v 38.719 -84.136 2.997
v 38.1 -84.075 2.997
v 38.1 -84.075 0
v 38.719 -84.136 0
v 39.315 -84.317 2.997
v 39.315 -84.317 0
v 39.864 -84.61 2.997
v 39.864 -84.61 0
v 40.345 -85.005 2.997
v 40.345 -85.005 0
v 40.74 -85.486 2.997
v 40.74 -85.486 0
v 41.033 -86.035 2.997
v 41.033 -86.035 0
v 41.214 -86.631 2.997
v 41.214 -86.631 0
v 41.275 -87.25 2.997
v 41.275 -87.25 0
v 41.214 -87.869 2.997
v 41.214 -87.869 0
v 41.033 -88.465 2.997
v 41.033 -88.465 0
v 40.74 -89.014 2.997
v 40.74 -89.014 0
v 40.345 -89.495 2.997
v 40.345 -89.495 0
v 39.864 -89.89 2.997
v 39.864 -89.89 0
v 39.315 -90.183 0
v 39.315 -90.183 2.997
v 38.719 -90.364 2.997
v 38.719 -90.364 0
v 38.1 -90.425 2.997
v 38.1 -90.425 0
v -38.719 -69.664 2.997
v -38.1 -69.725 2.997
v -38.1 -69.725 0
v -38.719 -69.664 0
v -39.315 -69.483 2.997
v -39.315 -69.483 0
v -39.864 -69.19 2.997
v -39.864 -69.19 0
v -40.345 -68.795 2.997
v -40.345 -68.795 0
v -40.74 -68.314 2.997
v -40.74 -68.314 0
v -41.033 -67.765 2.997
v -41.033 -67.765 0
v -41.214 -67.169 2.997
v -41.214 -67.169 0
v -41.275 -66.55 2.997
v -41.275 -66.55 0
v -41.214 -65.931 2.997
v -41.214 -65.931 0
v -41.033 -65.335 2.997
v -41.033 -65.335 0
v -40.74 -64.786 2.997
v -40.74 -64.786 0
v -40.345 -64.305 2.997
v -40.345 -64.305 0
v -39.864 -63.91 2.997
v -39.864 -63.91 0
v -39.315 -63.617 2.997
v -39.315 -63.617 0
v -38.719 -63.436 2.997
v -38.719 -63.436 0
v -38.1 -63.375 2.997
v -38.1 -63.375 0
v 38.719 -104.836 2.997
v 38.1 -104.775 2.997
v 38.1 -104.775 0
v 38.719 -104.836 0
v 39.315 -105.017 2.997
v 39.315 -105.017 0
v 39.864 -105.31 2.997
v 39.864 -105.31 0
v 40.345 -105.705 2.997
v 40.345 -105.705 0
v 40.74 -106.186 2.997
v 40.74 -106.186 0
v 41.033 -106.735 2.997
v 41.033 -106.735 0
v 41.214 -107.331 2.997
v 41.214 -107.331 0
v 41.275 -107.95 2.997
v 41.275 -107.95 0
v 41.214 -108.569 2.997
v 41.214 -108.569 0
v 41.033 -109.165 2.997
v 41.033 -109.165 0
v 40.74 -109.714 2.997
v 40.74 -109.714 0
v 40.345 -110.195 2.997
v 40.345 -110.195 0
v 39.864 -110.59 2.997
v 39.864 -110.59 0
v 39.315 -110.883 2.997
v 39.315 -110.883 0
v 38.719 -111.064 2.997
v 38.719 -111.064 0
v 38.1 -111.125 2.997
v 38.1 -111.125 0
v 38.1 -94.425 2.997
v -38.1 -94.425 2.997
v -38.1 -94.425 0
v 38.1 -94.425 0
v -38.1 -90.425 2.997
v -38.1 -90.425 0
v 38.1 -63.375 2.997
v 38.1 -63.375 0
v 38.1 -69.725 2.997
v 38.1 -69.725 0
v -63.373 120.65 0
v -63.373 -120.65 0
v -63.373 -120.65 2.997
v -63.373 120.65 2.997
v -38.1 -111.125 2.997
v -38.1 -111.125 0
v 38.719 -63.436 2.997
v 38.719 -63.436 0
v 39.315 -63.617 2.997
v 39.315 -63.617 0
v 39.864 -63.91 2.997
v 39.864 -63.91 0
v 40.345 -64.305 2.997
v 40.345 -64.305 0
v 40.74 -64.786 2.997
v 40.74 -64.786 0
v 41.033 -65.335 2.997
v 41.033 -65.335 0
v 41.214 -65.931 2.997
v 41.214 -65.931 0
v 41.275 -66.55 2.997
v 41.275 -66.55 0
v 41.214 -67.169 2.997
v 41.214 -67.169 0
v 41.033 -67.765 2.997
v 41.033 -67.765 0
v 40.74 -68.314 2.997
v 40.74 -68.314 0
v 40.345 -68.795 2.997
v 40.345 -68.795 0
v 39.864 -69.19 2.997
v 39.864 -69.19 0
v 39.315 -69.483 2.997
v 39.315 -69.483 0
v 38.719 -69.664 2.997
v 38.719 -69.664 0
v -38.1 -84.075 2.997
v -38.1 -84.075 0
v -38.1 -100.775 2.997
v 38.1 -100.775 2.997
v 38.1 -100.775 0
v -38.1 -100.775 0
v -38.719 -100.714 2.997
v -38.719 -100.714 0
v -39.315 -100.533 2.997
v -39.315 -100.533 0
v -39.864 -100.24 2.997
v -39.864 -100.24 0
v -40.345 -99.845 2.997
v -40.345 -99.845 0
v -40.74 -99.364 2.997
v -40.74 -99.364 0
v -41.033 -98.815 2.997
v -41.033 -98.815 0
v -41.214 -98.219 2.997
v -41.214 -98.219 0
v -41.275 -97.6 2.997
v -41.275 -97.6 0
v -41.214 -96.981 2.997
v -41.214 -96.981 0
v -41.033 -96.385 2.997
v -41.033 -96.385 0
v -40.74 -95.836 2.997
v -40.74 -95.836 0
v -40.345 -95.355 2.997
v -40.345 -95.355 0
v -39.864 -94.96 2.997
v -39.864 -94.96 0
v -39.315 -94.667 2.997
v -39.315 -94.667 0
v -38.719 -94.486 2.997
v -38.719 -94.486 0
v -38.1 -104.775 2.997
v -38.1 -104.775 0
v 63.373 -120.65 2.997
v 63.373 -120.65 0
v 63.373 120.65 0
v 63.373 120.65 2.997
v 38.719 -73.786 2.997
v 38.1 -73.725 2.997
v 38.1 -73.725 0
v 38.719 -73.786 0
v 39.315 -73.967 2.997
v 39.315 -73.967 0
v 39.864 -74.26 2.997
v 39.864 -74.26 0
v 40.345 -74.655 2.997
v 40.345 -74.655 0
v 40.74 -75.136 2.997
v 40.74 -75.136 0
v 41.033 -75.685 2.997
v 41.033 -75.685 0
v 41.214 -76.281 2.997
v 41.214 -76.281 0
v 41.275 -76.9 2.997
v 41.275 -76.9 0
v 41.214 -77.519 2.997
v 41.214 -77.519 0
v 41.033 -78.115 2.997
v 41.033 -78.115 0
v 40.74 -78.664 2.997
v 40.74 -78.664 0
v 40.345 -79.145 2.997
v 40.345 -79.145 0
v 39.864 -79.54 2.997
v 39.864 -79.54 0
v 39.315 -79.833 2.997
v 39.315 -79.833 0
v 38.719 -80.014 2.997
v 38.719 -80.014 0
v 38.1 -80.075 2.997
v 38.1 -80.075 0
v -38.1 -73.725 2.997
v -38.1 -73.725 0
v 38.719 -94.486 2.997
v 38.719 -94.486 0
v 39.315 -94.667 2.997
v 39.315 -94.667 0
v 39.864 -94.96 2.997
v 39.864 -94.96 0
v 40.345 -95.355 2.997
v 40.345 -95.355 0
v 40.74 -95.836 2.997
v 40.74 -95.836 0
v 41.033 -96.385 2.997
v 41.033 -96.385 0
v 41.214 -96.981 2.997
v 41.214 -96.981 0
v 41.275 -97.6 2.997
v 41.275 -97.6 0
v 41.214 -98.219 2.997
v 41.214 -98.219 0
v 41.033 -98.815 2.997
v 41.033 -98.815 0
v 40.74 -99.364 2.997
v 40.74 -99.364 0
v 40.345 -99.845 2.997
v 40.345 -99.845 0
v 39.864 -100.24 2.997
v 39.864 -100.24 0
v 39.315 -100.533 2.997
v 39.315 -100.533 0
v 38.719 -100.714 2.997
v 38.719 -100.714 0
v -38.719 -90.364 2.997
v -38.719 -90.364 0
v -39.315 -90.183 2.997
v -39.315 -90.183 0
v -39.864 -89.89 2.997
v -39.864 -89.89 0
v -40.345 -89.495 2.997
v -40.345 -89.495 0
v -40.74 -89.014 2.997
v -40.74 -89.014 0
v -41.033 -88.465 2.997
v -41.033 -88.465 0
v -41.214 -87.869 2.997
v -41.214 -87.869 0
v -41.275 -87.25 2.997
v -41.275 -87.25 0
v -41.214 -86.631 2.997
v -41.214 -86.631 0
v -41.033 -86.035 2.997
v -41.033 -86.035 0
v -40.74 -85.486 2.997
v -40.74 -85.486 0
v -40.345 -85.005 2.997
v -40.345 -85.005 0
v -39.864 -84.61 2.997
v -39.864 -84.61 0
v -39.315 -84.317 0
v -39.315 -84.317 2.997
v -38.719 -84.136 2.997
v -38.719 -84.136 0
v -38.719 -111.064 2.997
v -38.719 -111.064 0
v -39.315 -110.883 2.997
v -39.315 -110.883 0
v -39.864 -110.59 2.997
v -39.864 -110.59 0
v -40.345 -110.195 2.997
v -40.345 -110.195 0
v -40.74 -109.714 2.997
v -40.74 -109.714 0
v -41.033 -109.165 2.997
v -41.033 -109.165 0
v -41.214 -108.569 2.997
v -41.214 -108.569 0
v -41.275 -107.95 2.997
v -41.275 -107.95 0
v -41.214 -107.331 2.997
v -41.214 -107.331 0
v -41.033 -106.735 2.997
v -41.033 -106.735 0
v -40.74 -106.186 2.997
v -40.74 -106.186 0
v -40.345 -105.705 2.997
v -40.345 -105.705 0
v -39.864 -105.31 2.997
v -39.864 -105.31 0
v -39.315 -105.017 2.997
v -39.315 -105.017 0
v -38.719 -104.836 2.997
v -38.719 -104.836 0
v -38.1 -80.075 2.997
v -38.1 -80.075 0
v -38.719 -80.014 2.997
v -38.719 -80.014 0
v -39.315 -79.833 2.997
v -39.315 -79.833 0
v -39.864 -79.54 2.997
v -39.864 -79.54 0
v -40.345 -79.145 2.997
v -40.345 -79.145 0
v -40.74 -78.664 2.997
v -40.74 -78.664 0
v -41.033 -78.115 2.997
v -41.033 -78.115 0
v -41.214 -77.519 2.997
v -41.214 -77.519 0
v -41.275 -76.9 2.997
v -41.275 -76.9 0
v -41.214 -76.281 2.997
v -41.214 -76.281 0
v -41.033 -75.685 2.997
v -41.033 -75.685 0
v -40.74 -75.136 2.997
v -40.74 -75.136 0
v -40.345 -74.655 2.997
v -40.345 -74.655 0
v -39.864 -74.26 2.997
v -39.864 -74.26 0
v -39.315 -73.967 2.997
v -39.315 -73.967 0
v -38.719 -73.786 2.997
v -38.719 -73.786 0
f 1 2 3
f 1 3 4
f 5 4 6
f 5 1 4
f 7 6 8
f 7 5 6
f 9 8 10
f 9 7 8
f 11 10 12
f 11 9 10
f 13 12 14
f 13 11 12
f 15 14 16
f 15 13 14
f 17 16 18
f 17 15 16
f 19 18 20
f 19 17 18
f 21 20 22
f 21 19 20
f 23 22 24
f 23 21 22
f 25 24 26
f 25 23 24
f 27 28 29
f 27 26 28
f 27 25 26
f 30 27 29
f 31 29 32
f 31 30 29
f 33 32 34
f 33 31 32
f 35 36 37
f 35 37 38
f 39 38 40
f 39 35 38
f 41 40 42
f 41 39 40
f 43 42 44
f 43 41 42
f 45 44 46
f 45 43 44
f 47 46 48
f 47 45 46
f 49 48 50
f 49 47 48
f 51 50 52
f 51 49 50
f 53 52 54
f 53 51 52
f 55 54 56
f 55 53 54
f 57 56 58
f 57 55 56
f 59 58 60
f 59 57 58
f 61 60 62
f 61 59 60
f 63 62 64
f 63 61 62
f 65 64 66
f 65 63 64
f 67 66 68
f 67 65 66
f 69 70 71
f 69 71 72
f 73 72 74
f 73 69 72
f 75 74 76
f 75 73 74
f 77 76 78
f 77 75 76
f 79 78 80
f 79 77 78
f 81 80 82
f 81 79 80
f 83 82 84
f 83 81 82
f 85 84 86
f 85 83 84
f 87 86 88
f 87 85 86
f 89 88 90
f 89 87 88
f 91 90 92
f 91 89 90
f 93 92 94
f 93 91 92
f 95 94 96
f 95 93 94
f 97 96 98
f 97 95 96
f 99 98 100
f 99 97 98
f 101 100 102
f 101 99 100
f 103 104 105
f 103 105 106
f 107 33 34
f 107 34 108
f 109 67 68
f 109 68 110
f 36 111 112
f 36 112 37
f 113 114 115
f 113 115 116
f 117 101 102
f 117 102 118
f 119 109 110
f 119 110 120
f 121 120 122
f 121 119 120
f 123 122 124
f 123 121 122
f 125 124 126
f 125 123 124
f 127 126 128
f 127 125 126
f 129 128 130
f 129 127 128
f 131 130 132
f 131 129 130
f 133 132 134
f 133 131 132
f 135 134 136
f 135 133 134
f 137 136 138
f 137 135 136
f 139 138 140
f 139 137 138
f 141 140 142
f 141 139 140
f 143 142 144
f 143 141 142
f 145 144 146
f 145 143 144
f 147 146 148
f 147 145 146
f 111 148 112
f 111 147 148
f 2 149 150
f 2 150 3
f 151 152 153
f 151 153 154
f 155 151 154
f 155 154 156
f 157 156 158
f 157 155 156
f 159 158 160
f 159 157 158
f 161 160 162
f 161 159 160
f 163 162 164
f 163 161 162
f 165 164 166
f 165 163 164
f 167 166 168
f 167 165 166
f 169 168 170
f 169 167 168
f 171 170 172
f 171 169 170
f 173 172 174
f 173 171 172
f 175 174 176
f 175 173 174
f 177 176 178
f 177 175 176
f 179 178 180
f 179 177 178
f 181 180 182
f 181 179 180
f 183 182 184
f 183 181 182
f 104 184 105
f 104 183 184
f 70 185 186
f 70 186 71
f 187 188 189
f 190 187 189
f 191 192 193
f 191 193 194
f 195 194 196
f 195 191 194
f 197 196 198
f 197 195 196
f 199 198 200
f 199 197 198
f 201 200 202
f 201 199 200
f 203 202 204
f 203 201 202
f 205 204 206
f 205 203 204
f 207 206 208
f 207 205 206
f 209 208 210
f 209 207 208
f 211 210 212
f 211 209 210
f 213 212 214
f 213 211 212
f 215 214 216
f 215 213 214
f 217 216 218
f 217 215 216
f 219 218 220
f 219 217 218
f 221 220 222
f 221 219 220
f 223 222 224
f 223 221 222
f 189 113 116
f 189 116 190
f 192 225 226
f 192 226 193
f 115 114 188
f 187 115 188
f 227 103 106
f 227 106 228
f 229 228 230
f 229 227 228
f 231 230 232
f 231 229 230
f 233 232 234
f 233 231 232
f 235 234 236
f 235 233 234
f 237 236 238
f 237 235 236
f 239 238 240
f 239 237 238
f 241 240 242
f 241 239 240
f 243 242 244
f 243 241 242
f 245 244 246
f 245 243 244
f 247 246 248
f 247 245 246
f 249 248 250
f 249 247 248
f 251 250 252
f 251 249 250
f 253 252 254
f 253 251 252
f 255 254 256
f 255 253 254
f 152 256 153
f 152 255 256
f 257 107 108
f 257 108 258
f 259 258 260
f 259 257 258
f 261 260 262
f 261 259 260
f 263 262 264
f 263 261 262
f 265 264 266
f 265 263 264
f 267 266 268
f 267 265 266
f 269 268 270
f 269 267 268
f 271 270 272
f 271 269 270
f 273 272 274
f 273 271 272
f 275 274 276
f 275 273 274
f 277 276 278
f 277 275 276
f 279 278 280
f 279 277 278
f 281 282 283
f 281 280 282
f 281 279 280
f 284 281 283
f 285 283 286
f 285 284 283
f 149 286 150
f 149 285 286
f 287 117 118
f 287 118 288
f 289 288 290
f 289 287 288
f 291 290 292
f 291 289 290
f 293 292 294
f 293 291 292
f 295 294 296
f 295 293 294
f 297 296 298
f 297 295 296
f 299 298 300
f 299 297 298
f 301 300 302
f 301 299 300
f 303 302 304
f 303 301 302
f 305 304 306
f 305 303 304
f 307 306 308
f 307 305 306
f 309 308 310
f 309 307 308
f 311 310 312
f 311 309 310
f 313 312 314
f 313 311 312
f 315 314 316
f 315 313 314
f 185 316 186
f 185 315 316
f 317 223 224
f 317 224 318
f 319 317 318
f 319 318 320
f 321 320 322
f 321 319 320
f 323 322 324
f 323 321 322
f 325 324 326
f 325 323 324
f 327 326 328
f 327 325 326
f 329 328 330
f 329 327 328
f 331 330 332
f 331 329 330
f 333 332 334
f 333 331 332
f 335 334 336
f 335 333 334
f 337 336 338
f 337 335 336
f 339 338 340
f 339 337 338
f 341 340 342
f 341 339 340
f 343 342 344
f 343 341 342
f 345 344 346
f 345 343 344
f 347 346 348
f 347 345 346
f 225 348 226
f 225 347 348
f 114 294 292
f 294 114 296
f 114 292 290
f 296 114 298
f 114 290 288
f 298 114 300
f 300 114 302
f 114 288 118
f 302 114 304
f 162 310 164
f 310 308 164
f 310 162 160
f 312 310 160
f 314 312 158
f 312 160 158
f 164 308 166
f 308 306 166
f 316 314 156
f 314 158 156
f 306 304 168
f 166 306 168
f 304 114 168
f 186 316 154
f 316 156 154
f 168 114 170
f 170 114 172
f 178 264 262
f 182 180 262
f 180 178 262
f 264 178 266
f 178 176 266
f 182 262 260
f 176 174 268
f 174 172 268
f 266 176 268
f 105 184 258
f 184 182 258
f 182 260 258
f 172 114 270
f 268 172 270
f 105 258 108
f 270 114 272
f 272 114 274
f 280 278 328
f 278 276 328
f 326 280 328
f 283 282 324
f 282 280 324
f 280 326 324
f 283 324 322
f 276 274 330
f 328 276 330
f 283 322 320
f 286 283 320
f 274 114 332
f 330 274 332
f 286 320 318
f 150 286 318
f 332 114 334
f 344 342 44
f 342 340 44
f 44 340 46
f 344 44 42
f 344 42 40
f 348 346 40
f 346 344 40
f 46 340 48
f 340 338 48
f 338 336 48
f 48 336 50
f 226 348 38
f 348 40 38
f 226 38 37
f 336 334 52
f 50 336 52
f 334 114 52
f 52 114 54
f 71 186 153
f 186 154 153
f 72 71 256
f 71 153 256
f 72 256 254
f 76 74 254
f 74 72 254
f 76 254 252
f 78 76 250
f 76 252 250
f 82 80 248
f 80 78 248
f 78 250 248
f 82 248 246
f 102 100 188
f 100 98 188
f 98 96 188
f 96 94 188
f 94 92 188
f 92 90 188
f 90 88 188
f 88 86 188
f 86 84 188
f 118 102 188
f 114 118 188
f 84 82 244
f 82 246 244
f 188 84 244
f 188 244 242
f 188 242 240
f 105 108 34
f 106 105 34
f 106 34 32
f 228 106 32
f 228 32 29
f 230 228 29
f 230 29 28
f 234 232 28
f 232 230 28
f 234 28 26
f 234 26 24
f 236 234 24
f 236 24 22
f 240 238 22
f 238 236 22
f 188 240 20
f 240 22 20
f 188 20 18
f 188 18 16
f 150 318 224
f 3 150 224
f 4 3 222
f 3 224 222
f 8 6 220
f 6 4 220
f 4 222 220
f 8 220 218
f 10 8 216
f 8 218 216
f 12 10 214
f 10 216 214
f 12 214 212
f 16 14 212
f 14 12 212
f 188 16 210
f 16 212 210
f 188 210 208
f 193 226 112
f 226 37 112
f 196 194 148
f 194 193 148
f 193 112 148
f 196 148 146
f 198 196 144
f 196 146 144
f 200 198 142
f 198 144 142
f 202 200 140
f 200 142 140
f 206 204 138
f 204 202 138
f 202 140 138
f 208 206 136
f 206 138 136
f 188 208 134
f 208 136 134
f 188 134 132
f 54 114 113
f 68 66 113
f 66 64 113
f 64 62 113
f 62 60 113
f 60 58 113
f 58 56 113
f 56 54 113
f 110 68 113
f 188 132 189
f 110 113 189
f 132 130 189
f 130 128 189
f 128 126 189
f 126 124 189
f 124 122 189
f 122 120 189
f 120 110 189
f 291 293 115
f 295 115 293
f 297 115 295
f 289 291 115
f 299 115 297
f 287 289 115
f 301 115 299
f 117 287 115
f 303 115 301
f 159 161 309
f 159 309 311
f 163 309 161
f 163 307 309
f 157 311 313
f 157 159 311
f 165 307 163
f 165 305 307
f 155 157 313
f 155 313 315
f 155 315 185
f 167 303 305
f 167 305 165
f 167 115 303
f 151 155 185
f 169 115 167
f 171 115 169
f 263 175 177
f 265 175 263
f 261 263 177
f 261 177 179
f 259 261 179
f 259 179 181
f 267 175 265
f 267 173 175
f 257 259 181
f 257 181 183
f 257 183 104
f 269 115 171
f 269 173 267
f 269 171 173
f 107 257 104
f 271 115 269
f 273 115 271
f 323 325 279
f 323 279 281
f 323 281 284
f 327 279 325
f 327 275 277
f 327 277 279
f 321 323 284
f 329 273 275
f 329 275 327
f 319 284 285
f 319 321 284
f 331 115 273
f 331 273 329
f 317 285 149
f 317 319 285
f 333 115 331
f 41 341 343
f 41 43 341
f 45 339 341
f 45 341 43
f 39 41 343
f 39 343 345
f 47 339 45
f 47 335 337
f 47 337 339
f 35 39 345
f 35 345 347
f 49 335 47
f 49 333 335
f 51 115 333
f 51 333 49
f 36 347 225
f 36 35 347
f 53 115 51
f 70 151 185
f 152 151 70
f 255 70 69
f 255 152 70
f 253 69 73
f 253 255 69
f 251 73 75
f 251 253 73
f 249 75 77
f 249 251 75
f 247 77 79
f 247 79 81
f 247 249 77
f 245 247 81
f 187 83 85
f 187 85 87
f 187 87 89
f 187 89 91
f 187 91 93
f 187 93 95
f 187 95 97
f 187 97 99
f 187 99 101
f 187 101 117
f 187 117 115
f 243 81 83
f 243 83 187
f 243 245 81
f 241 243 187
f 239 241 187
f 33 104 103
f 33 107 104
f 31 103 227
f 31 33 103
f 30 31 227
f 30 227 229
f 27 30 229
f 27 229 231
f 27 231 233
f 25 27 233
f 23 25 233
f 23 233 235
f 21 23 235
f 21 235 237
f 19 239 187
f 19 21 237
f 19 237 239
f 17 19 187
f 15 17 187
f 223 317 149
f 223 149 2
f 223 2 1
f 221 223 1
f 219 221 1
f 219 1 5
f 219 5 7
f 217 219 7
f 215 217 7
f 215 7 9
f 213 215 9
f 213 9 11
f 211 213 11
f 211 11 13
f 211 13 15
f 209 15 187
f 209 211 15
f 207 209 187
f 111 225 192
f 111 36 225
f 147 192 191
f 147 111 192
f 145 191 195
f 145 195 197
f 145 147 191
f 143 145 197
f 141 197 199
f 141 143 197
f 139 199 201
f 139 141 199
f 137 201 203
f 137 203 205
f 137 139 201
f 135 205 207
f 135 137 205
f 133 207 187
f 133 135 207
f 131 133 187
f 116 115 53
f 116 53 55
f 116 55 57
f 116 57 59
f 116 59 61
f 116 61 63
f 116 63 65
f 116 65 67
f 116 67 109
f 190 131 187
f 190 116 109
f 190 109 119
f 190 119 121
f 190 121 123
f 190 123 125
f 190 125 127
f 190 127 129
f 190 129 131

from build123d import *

# Parameters (mm, degrees)
SKETCH1_W           = 126.746
SKETCH1_H           = 241.3
BOSS_EXTRUDE1_DEPTH = 2.9972
CUT_EXTRUDE1_DEPTH  = 137.314132931


with BuildPart() as part:
    # Sketch1 → Boss-Extrude1 (new body)
    with BuildSketch(Plane.XY):
        Rectangle(SKETCH1_W, SKETCH1_H)
    extrude(amount=BOSS_EXTRUDE1_DEPTH)

    # Sketch2 → Cut-Extrude1 (cut, through all)
    with BuildSketch(Plane.XY.offset(2.9972)):
        with BuildLine():
            Line((-38.1, -63.375), (38.1, -63.375))
            ThreePointArc((38.1, -63.375), (41.275, -66.55), (38.1, -69.725))
            Line((38.1, -69.725), (-38.1, -69.725))
            ThreePointArc((-38.1, -69.725), (-41.275, -66.55), (-38.1, -63.375))
        make_face()
        with BuildLine():
            Line((-38.1, -84.075), (38.1, -84.075))
            ThreePointArc((38.1, -84.075), (41.275, -87.25), (38.1, -90.425))
            Line((38.1, -90.425), (-38.1, -90.425))
            ThreePointArc((-38.1, -90.425), (-41.275, -87.25), (-38.1, -84.075))
        make_face()
        with BuildLine():
            Line((-38.1, -104.775), (38.1, -104.775))
            ThreePointArc((38.1, -104.775), (41.275, -107.95), (38.1, -111.125))
            Line((38.1, -111.125), (-38.1, -111.125))
            ThreePointArc((-38.1, -111.125), (-41.275, -107.95), (-38.1, -104.775))
        make_face()
        with BuildLine():
            Line((-38.1, -73.725), (38.1, -73.725))
            ThreePointArc((38.1, -73.725), (41.275, -76.9), (38.1, -80.075))
            Line((38.1, -80.075), (-38.1, -80.075))
            ThreePointArc((-38.1, -80.075), (-41.275, -76.9), (-38.1, -73.725))
        make_face()
        with BuildLine():
            Line((-38.1, -94.425), (38.1, -94.425))
            ThreePointArc((38.1, -94.425), (41.275, -97.6), (38.1, -100.775))
            Line((38.1, -100.775), (-38.1, -100.775))
            ThreePointArc((-38.1, -100.775), (-41.275, -97.6), (-38.1, -94.425))
        make_face()
    extrude(amount=-CUT_EXTRUDE1_DEPTH, mode=Mode.SUBTRACT)


solid = part.part
